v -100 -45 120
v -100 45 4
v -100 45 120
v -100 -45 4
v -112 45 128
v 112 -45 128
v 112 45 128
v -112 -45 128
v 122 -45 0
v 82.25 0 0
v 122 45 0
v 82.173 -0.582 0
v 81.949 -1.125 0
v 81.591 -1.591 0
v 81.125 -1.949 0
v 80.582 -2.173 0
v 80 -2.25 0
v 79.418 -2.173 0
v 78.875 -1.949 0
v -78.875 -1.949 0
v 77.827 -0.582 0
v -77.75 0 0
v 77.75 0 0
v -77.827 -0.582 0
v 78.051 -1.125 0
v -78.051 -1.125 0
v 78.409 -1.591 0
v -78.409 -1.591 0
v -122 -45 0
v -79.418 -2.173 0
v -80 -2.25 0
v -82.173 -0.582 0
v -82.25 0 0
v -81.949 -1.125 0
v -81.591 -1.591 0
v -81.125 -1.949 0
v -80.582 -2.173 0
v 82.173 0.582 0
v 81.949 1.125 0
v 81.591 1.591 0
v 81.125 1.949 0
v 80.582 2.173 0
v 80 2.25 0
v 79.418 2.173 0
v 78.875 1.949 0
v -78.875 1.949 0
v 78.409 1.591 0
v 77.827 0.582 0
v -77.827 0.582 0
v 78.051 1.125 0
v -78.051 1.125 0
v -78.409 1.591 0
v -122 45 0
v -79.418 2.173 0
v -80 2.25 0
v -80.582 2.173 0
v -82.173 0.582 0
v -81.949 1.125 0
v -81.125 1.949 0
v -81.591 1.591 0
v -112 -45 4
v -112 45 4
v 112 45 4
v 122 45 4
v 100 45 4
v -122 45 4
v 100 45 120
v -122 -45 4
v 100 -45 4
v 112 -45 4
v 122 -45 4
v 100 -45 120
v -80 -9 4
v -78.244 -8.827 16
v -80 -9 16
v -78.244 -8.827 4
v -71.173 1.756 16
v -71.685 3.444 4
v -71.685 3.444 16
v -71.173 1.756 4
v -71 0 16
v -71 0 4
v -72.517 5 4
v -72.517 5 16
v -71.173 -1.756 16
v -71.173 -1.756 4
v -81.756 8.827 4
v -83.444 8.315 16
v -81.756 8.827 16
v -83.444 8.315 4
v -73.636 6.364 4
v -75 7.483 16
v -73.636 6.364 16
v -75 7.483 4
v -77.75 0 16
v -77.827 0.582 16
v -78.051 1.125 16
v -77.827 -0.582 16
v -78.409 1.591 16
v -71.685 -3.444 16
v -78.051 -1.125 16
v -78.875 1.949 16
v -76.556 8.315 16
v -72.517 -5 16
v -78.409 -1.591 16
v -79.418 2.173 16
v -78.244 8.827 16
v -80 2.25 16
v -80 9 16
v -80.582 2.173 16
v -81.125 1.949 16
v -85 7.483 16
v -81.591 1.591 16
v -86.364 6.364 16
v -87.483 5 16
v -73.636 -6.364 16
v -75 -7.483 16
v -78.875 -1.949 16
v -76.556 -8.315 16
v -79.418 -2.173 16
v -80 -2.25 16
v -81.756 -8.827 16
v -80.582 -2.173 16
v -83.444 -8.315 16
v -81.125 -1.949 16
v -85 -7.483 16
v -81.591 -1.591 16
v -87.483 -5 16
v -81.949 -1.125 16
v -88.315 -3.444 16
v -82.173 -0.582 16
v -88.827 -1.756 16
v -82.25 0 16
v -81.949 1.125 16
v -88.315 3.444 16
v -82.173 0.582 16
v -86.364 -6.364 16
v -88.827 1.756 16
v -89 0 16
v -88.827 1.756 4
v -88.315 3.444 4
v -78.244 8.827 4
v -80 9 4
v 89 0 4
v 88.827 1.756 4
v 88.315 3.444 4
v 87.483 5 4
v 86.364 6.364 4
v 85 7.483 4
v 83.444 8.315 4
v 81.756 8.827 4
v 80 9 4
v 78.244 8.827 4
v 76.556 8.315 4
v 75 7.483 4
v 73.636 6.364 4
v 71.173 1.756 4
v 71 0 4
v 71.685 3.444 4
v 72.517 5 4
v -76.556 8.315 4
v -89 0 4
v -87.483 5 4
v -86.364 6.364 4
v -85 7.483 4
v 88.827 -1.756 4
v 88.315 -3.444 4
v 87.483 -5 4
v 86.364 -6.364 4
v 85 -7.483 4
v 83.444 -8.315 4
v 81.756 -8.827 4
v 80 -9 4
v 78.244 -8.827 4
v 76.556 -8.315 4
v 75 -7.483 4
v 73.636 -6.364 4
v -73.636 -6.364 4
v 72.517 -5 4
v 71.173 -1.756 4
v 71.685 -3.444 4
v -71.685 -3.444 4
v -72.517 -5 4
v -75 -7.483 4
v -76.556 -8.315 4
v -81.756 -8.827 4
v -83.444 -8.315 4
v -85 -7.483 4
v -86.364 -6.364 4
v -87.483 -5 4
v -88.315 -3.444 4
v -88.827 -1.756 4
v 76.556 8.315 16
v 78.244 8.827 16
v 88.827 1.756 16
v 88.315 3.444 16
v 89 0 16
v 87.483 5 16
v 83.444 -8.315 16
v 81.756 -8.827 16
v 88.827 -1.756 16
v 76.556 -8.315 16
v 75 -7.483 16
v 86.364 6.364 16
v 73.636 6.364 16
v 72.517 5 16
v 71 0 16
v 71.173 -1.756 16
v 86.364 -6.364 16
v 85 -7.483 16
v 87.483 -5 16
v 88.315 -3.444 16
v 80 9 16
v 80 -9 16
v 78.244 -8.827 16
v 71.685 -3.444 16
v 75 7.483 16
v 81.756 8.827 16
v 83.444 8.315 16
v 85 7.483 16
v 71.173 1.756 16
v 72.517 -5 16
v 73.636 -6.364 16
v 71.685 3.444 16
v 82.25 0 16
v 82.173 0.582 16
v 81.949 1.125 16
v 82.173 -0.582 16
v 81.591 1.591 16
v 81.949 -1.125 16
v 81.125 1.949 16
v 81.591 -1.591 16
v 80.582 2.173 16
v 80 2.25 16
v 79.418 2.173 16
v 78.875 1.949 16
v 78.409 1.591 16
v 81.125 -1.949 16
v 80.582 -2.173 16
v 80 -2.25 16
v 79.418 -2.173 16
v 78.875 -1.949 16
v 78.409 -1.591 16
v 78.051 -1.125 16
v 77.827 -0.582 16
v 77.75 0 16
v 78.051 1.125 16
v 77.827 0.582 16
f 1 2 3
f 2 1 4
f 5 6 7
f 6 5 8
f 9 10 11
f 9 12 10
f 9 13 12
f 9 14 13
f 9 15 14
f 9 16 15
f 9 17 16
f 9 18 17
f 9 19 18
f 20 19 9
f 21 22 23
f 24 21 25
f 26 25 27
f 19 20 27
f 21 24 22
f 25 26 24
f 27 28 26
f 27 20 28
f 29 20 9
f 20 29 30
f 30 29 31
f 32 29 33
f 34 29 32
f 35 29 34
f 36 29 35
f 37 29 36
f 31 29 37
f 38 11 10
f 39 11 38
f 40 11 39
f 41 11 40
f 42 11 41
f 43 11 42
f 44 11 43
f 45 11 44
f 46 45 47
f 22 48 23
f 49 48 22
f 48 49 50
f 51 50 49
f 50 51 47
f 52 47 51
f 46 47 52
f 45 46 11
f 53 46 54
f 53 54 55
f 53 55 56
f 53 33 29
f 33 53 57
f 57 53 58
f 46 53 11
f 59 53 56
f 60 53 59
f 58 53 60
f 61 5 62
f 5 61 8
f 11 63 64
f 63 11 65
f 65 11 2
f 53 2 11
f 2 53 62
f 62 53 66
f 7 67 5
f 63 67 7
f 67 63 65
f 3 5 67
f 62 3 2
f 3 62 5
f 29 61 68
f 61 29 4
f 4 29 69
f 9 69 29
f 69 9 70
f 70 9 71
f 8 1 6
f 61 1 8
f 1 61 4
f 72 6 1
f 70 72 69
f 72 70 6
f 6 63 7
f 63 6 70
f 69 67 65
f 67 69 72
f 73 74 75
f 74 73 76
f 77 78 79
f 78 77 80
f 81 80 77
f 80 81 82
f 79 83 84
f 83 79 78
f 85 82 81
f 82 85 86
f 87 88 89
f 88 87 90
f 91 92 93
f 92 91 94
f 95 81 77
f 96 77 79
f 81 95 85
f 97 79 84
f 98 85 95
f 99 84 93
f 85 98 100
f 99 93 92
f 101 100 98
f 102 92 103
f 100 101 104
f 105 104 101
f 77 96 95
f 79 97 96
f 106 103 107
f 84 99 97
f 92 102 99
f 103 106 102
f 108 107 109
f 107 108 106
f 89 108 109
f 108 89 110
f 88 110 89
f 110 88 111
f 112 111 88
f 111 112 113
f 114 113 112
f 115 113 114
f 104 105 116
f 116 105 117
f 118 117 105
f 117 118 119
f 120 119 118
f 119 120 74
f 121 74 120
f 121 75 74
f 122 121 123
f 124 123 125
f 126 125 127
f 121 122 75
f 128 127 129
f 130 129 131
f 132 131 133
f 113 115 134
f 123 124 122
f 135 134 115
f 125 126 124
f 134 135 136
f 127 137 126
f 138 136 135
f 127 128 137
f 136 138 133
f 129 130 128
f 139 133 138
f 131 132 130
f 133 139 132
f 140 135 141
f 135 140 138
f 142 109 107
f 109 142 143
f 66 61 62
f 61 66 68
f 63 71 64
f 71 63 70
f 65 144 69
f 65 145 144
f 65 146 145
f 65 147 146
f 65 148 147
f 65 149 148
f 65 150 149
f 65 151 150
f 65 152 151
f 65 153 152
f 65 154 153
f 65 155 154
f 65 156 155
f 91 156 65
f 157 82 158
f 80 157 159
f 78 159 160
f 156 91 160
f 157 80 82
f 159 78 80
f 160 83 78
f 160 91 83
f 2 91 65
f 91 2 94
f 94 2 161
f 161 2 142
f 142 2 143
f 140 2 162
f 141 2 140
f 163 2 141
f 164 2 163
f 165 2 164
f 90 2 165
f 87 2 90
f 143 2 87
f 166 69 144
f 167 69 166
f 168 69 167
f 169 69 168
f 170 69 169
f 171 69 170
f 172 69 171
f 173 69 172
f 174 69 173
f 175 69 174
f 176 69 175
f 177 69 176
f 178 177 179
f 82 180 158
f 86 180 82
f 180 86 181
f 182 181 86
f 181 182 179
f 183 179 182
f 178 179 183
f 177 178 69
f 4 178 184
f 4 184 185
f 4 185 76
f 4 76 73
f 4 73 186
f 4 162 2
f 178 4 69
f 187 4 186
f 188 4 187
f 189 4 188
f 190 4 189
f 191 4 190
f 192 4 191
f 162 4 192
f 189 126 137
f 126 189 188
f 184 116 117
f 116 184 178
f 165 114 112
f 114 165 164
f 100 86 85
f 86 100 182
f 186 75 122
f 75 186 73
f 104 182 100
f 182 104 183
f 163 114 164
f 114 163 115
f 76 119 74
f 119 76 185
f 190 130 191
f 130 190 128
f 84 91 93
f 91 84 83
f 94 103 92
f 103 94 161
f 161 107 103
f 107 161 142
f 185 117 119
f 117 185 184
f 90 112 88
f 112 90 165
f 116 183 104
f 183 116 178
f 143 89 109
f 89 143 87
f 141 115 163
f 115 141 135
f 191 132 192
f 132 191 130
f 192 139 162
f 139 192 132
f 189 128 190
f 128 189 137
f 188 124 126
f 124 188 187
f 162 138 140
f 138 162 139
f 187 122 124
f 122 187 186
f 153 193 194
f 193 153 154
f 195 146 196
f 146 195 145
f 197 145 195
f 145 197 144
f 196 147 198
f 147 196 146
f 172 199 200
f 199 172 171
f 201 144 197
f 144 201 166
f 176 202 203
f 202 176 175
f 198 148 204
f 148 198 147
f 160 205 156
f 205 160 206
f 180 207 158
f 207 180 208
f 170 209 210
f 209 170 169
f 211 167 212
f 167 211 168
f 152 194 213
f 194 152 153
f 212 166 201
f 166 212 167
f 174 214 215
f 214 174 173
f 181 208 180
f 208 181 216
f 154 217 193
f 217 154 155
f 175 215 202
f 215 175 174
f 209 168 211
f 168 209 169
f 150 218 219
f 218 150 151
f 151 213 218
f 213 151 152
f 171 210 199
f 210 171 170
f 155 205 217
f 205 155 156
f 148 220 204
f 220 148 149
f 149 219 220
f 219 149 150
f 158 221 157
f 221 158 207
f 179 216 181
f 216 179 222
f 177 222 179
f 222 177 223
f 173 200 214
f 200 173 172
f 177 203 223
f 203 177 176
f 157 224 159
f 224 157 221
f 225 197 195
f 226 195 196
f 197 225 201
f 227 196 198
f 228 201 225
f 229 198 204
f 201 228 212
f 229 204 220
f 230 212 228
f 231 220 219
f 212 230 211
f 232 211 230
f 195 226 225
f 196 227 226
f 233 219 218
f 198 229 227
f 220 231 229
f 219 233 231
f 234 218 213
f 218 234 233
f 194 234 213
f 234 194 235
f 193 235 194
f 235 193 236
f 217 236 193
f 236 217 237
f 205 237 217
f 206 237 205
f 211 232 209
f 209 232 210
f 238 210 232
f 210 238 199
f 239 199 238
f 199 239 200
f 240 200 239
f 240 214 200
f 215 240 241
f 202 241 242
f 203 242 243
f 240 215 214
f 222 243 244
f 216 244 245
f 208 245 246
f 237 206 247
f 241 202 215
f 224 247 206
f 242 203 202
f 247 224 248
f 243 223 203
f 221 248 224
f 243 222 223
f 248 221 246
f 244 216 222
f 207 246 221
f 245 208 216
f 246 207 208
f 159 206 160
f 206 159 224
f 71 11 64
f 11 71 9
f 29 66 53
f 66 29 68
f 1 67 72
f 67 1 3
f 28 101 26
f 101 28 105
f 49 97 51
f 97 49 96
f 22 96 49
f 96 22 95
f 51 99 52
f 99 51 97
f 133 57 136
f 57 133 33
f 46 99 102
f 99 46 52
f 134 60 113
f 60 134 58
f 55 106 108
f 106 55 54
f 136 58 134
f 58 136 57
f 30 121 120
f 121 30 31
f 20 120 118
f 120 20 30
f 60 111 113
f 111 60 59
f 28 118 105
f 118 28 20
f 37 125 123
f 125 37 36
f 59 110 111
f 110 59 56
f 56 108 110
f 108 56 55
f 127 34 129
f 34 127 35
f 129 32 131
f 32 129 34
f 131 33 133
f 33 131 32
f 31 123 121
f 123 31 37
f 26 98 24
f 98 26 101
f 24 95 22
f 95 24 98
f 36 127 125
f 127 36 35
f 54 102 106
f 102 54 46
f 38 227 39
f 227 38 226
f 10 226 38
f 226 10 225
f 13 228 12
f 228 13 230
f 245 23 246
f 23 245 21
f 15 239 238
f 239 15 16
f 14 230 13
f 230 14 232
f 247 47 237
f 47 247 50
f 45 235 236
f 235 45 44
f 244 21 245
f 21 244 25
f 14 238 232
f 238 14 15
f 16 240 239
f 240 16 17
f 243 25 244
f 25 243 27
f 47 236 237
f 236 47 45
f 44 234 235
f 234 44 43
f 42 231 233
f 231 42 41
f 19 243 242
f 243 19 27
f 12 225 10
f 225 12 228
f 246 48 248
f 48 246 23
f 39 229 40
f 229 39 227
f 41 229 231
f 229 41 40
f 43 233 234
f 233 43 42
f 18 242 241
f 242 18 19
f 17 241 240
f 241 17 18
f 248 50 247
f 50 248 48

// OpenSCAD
// file: ../models/drone-playground-over-under-bridge/model.scad
clear_width=200; clear_height=120; roof_width=220; roof_depth=90; post=12; base_thickness=4; mount_hole_diameter=4.5;
module over_under_bridge(){ difference(){ union(){ translate([-122,-roof_depth/2,0]) cube([244,roof_depth,base_thickness]); for(x=[-clear_width/2-post,clear_width/2]) translate([x,-roof_depth/2,0]) cube([post,roof_depth,clear_height+8]); translate([-roof_width/2,-roof_depth/2,clear_height]) cube([roof_width,roof_depth,8]); for(x=[-80,80]) translate([x,0,base_thickness]) cylinder(d=18,h=12,$fn=32); } for(x=[-80,80]) translate([x,0,-1]) cylinder(d=mount_hole_diameter,h=18,$fn=24); }}
assert(clear_width==200 && clear_height==120 && roof_width==220); echo("SCADCTL_REQUIREMENT:parameters:PASS"); over_under_bridge();
// main file
use <../models/drone-playground-over-under-bridge/model.scad>
color("dodgerblue") over_under_bridge();
